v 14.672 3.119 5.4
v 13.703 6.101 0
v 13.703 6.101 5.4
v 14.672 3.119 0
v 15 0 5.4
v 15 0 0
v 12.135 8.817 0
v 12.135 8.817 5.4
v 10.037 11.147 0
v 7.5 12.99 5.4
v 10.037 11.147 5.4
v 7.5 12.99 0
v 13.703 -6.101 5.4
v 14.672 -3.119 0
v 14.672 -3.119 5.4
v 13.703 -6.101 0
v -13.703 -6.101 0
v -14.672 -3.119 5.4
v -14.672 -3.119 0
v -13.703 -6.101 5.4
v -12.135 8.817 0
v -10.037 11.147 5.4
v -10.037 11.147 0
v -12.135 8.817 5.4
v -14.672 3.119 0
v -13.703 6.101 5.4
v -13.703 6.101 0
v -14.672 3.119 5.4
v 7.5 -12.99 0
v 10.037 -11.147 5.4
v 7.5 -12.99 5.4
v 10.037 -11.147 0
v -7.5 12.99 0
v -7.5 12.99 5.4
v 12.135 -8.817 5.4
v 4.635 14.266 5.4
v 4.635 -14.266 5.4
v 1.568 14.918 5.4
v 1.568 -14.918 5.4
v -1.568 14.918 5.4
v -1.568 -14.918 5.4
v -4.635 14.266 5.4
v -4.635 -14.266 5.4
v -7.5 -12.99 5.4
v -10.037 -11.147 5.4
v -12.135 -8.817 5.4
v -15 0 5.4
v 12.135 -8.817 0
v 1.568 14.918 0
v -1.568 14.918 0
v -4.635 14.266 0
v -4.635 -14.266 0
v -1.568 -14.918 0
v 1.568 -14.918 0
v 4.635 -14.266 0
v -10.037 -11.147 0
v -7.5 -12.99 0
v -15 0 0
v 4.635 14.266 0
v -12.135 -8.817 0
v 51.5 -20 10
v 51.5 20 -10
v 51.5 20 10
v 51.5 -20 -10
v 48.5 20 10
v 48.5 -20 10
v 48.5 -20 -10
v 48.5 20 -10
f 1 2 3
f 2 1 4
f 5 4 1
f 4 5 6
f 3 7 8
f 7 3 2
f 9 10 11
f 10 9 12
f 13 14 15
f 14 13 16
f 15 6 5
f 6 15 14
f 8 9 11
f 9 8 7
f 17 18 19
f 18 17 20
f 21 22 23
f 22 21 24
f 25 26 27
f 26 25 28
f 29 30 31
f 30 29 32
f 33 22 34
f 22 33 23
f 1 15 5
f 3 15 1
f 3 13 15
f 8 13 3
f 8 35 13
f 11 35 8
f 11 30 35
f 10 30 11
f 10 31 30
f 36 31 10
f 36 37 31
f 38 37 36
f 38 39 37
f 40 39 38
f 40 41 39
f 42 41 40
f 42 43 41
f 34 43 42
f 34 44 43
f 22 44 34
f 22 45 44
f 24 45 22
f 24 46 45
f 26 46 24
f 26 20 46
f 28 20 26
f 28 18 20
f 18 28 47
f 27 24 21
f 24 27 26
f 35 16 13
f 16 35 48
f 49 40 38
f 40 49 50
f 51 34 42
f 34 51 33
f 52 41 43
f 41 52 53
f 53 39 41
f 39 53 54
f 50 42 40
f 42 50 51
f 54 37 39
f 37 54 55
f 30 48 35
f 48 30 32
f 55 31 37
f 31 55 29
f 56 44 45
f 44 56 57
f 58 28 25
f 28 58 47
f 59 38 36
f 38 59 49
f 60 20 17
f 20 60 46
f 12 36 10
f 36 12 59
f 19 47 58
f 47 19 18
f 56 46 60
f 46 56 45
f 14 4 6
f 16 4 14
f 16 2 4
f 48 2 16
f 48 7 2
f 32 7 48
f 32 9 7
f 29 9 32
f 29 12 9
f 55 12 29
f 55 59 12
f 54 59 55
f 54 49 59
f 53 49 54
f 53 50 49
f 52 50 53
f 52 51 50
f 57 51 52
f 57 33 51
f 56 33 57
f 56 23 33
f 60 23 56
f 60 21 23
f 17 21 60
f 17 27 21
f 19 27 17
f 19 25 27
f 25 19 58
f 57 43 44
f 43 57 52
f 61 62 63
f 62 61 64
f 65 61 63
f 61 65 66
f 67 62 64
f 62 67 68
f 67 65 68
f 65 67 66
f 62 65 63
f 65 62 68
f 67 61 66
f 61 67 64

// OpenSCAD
cylinder(5.4, r = 15, true);
translate([50,0,0]) {
	cube([3, 40, 20], true);
}
